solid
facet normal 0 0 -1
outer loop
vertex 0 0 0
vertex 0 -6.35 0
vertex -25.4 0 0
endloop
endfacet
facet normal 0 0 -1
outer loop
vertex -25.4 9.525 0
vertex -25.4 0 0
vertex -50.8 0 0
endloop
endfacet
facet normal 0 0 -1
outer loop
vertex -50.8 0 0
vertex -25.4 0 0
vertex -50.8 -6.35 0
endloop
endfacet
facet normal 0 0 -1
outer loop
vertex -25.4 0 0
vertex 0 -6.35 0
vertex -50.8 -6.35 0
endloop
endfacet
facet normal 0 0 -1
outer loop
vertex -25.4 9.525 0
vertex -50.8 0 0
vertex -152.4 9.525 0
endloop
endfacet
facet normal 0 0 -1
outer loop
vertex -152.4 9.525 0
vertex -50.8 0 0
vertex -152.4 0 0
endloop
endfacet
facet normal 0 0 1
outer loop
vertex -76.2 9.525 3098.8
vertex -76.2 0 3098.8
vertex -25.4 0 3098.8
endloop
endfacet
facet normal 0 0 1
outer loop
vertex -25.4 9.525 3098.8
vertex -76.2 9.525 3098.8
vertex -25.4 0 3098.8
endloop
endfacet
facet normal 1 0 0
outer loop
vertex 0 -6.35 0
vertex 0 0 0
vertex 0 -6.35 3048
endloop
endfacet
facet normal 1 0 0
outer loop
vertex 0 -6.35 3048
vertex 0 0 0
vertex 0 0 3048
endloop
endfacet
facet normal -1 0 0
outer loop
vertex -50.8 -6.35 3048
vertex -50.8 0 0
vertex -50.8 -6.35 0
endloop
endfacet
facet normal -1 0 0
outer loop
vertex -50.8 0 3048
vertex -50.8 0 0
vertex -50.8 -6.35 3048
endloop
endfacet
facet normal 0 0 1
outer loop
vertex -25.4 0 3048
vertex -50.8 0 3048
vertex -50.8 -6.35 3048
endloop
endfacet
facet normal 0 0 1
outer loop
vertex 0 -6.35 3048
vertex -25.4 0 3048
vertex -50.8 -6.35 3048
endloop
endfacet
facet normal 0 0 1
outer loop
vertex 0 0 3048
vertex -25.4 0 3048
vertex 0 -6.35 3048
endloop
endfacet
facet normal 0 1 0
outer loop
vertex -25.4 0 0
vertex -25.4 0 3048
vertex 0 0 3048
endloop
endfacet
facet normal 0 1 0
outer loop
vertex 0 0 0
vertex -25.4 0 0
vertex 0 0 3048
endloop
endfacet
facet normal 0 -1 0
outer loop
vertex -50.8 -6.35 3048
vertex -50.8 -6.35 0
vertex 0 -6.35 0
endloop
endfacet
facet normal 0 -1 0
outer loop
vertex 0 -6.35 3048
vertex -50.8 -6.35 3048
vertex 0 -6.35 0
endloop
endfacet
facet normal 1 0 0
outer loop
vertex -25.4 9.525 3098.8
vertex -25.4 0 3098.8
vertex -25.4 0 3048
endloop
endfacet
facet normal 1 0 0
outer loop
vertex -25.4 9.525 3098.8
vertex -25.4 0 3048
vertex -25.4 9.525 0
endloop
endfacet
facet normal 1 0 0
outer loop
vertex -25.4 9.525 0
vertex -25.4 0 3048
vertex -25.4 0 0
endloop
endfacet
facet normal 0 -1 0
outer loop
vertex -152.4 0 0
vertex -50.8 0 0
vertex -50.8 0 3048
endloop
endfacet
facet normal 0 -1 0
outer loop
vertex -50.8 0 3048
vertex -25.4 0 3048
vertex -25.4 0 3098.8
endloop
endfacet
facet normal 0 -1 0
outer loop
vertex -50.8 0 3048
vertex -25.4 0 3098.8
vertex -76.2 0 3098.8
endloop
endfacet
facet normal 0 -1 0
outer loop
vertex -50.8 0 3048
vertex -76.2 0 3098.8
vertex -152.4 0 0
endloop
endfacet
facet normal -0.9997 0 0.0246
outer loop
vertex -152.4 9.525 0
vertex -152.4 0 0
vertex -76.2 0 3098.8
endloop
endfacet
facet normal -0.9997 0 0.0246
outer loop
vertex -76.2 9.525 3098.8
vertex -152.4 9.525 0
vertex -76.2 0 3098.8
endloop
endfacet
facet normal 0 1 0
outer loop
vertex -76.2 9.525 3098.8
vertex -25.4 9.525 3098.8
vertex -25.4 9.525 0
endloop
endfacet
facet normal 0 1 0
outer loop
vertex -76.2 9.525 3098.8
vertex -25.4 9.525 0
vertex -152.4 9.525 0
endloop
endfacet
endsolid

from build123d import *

# Parameters (mm, degrees)
F0_W     = 50.8
F0_H     = 3048
F1_DEPTH = 6.35
F3_DEPTH = 9.525


with BuildPart() as f1:
    # F0 (on Front) → F1 (new body)
    with BuildSketch(Plane.XZ):
        with Locations((-25.4, 1524)):
            Rectangle(F0_W, F0_H)
    extrude(amount=F1_DEPTH)

    # F2 (on face) → F3 (join)
    with BuildSketch(Plane(origin=(0, 0, 0), x_dir=(-1, 0, 0), z_dir=(0, 1, 0))):
        Polygon((152.4, 0), (76.2, 3098.8), (25.4, 3098.8), (25.4, 0), align=None)
    extrude(amount=F3_DEPTH)


solid = f1.part
